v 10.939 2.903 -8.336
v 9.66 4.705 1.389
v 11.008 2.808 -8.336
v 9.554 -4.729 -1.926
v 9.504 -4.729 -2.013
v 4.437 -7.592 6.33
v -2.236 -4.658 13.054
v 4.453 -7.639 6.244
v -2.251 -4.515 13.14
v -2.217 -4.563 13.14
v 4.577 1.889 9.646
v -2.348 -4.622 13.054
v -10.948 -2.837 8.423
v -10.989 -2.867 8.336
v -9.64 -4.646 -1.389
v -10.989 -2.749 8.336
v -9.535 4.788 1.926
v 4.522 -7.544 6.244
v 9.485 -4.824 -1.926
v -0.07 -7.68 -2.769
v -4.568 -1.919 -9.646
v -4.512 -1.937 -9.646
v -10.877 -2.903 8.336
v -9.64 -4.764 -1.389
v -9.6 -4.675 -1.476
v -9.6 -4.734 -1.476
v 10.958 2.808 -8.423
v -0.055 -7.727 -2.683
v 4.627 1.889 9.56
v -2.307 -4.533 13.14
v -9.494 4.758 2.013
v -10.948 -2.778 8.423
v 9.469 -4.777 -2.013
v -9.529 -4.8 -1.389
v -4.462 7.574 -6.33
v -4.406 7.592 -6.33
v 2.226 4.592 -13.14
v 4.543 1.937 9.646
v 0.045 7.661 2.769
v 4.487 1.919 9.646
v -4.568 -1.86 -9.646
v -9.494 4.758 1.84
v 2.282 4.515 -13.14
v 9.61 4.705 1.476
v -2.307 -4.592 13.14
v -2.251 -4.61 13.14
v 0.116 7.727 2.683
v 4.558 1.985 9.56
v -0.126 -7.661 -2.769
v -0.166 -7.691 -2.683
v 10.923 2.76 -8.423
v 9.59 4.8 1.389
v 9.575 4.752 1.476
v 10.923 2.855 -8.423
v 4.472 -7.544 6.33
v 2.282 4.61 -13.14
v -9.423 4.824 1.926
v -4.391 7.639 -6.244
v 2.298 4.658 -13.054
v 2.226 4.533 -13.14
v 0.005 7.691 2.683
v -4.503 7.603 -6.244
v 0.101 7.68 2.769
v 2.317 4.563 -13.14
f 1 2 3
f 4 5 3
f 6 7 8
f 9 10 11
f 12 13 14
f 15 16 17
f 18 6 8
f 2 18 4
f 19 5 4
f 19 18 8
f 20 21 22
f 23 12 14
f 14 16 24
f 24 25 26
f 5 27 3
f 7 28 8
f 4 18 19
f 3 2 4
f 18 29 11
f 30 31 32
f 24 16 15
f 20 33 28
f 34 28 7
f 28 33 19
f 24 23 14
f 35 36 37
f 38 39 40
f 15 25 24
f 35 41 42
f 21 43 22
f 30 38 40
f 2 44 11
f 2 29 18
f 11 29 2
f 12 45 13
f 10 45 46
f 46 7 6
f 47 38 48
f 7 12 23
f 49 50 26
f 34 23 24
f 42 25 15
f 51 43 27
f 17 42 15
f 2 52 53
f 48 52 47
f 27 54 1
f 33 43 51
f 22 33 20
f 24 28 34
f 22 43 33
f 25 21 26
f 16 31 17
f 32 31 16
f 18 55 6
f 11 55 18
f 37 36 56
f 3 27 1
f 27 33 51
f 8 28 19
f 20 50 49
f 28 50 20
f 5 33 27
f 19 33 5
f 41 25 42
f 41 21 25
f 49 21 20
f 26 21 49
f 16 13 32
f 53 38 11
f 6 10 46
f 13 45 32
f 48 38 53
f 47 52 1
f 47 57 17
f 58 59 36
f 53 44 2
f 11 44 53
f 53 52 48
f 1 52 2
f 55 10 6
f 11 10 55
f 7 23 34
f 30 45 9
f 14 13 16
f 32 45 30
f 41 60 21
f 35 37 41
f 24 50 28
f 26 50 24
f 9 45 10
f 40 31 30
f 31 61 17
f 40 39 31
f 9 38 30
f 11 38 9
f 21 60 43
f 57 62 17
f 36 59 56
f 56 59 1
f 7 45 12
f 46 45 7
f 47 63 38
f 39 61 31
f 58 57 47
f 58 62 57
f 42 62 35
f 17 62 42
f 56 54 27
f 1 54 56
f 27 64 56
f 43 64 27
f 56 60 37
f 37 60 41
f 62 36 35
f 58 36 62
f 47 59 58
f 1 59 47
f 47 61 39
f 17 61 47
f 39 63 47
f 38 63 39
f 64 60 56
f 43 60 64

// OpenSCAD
// Auto-generated OpenSCAD file

    inner_points = 10*[[0.9453936894816409, -0.47289547434939777, -0.19263732612249004], [0.9559597690770948, 0.47047255319654285, 0.13894241174769978], [-0.4527324971708146, -0.18894257072883713, -0.9559510908824418], [-0.44216641757536057, 0.7544254568171036, -0.624371353012252], [0.44216641757536057, -0.7544254568171036, 0.624371353012252], [0.4527324971708146, 0.18894257072883713, 0.9559510908824418], [-0.9559597690770948, -0.47047255319654285, -0.13894241174769978], [-0.9453936894816409, 0.47289547434939777, 0.19263732612249004], [1.0907778029145119, 0.2807812586554431, -0.8336013201880601], [0.22668829900201493, 0.4562738042971726, -1.305355170890352], [-0.22668829900201493, -0.4562738042971726, 1.305355170890352], [-1.0907778029145119, -0.2807812586554431, 0.8336013201880601], [-0.008548137956640611, -0.7632007662346396, -0.2682536429273739], [0.008548137956640611, 0.7632007662346396, 0.2682536429273739]];

    outer_points = 10*[[0.513230909726221, -0.9184428339478712, -0.2180946841600515], [0.4587614600394385, -0.6315952925971899, 0.738331772537947], [0.5396207656457714, 0.6315952925971899, -0.6814728995641832], [0.485151315958989, 0.9184428339478712, 0.27495355713381525], [-0.485151315958989, -0.9184428339478712, -0.27495355713381525], [-0.5396207656457714, -0.6315952925971899, 0.6814728995641832], [-0.4587614600394385, 0.6315952925971899, -0.738331772537947], [-0.513230909726221, 0.9184428339478712, 0.2180946841600515], [1.2987443863455765, -0.47898812303152916, 0.21762097438667488], [1.3150542142620716, 0.47898812303152916, -0.06876251237934862], [-1.3150542142620716, -0.47898812303152916, 0.06876251237934862], [-1.2987443863455765, 0.47898812303152916, -0.21762097438667488], [0.04406671047085817, -0.23206453574737165, -0.7737652573384957], [-0.04406671047085817, 0.23206453574737165, 0.7737652573384957]];

    // Convex hull for inner set (I)
    module inner_hull() {
        hull() {
            for (p = inner_points) {
                translate(p) sphere(r=0.1);
            }
        }
    }

    // Convex hull for outer set (O) minus inner hull (O \ I)
    module outer_minus_inner() {
        difference() {
            hull() {
                for (p = outer_points) {
                    translate(p) sphere(r=0.1);
                }
            }
            inner_hull(); // Subtract inner hull
        }
    }

    // Convex hull for outer set (O) minus all translated inner hulls
    module outer_minus_AllTranslationInner() {
        difference() {
            hull() {
                for (p = outer_points) {
                    translate(p) sphere(r=0.1);
                }
            }
            hull() {
                translate([0,0,50]) inner_hull();
                translate([0,0,-50]) inner_hull();
            }; // Subtract translated inner hulls
        }
    }

    // Difference between outer_minus_inner and outer_minus_AllTranslationInner
    module outer_minus_inner_diff() {
        difference() {
            // Outer minus inner
            difference() {
                hull() {
                    for (p = outer_points) {
                        translate(p) sphere(r=0.1);
                    }
                }
                inner_hull();
            }

            // Subtract Outer minus AllTranslationInner
            difference() {
                hull() {
                    for (p = outer_points) {
                        translate(p) sphere(r=0.1);
                    }
                }
                hull() {
                    translate([0,0,50]) inner_hull();
                    translate([0,0,-50]) inner_hull();
                };
            }
        }
    }

    // Rendering all with colors applied
    color([1, 0, 0, 0.5]) inner_hull(); // Transparent red
    
